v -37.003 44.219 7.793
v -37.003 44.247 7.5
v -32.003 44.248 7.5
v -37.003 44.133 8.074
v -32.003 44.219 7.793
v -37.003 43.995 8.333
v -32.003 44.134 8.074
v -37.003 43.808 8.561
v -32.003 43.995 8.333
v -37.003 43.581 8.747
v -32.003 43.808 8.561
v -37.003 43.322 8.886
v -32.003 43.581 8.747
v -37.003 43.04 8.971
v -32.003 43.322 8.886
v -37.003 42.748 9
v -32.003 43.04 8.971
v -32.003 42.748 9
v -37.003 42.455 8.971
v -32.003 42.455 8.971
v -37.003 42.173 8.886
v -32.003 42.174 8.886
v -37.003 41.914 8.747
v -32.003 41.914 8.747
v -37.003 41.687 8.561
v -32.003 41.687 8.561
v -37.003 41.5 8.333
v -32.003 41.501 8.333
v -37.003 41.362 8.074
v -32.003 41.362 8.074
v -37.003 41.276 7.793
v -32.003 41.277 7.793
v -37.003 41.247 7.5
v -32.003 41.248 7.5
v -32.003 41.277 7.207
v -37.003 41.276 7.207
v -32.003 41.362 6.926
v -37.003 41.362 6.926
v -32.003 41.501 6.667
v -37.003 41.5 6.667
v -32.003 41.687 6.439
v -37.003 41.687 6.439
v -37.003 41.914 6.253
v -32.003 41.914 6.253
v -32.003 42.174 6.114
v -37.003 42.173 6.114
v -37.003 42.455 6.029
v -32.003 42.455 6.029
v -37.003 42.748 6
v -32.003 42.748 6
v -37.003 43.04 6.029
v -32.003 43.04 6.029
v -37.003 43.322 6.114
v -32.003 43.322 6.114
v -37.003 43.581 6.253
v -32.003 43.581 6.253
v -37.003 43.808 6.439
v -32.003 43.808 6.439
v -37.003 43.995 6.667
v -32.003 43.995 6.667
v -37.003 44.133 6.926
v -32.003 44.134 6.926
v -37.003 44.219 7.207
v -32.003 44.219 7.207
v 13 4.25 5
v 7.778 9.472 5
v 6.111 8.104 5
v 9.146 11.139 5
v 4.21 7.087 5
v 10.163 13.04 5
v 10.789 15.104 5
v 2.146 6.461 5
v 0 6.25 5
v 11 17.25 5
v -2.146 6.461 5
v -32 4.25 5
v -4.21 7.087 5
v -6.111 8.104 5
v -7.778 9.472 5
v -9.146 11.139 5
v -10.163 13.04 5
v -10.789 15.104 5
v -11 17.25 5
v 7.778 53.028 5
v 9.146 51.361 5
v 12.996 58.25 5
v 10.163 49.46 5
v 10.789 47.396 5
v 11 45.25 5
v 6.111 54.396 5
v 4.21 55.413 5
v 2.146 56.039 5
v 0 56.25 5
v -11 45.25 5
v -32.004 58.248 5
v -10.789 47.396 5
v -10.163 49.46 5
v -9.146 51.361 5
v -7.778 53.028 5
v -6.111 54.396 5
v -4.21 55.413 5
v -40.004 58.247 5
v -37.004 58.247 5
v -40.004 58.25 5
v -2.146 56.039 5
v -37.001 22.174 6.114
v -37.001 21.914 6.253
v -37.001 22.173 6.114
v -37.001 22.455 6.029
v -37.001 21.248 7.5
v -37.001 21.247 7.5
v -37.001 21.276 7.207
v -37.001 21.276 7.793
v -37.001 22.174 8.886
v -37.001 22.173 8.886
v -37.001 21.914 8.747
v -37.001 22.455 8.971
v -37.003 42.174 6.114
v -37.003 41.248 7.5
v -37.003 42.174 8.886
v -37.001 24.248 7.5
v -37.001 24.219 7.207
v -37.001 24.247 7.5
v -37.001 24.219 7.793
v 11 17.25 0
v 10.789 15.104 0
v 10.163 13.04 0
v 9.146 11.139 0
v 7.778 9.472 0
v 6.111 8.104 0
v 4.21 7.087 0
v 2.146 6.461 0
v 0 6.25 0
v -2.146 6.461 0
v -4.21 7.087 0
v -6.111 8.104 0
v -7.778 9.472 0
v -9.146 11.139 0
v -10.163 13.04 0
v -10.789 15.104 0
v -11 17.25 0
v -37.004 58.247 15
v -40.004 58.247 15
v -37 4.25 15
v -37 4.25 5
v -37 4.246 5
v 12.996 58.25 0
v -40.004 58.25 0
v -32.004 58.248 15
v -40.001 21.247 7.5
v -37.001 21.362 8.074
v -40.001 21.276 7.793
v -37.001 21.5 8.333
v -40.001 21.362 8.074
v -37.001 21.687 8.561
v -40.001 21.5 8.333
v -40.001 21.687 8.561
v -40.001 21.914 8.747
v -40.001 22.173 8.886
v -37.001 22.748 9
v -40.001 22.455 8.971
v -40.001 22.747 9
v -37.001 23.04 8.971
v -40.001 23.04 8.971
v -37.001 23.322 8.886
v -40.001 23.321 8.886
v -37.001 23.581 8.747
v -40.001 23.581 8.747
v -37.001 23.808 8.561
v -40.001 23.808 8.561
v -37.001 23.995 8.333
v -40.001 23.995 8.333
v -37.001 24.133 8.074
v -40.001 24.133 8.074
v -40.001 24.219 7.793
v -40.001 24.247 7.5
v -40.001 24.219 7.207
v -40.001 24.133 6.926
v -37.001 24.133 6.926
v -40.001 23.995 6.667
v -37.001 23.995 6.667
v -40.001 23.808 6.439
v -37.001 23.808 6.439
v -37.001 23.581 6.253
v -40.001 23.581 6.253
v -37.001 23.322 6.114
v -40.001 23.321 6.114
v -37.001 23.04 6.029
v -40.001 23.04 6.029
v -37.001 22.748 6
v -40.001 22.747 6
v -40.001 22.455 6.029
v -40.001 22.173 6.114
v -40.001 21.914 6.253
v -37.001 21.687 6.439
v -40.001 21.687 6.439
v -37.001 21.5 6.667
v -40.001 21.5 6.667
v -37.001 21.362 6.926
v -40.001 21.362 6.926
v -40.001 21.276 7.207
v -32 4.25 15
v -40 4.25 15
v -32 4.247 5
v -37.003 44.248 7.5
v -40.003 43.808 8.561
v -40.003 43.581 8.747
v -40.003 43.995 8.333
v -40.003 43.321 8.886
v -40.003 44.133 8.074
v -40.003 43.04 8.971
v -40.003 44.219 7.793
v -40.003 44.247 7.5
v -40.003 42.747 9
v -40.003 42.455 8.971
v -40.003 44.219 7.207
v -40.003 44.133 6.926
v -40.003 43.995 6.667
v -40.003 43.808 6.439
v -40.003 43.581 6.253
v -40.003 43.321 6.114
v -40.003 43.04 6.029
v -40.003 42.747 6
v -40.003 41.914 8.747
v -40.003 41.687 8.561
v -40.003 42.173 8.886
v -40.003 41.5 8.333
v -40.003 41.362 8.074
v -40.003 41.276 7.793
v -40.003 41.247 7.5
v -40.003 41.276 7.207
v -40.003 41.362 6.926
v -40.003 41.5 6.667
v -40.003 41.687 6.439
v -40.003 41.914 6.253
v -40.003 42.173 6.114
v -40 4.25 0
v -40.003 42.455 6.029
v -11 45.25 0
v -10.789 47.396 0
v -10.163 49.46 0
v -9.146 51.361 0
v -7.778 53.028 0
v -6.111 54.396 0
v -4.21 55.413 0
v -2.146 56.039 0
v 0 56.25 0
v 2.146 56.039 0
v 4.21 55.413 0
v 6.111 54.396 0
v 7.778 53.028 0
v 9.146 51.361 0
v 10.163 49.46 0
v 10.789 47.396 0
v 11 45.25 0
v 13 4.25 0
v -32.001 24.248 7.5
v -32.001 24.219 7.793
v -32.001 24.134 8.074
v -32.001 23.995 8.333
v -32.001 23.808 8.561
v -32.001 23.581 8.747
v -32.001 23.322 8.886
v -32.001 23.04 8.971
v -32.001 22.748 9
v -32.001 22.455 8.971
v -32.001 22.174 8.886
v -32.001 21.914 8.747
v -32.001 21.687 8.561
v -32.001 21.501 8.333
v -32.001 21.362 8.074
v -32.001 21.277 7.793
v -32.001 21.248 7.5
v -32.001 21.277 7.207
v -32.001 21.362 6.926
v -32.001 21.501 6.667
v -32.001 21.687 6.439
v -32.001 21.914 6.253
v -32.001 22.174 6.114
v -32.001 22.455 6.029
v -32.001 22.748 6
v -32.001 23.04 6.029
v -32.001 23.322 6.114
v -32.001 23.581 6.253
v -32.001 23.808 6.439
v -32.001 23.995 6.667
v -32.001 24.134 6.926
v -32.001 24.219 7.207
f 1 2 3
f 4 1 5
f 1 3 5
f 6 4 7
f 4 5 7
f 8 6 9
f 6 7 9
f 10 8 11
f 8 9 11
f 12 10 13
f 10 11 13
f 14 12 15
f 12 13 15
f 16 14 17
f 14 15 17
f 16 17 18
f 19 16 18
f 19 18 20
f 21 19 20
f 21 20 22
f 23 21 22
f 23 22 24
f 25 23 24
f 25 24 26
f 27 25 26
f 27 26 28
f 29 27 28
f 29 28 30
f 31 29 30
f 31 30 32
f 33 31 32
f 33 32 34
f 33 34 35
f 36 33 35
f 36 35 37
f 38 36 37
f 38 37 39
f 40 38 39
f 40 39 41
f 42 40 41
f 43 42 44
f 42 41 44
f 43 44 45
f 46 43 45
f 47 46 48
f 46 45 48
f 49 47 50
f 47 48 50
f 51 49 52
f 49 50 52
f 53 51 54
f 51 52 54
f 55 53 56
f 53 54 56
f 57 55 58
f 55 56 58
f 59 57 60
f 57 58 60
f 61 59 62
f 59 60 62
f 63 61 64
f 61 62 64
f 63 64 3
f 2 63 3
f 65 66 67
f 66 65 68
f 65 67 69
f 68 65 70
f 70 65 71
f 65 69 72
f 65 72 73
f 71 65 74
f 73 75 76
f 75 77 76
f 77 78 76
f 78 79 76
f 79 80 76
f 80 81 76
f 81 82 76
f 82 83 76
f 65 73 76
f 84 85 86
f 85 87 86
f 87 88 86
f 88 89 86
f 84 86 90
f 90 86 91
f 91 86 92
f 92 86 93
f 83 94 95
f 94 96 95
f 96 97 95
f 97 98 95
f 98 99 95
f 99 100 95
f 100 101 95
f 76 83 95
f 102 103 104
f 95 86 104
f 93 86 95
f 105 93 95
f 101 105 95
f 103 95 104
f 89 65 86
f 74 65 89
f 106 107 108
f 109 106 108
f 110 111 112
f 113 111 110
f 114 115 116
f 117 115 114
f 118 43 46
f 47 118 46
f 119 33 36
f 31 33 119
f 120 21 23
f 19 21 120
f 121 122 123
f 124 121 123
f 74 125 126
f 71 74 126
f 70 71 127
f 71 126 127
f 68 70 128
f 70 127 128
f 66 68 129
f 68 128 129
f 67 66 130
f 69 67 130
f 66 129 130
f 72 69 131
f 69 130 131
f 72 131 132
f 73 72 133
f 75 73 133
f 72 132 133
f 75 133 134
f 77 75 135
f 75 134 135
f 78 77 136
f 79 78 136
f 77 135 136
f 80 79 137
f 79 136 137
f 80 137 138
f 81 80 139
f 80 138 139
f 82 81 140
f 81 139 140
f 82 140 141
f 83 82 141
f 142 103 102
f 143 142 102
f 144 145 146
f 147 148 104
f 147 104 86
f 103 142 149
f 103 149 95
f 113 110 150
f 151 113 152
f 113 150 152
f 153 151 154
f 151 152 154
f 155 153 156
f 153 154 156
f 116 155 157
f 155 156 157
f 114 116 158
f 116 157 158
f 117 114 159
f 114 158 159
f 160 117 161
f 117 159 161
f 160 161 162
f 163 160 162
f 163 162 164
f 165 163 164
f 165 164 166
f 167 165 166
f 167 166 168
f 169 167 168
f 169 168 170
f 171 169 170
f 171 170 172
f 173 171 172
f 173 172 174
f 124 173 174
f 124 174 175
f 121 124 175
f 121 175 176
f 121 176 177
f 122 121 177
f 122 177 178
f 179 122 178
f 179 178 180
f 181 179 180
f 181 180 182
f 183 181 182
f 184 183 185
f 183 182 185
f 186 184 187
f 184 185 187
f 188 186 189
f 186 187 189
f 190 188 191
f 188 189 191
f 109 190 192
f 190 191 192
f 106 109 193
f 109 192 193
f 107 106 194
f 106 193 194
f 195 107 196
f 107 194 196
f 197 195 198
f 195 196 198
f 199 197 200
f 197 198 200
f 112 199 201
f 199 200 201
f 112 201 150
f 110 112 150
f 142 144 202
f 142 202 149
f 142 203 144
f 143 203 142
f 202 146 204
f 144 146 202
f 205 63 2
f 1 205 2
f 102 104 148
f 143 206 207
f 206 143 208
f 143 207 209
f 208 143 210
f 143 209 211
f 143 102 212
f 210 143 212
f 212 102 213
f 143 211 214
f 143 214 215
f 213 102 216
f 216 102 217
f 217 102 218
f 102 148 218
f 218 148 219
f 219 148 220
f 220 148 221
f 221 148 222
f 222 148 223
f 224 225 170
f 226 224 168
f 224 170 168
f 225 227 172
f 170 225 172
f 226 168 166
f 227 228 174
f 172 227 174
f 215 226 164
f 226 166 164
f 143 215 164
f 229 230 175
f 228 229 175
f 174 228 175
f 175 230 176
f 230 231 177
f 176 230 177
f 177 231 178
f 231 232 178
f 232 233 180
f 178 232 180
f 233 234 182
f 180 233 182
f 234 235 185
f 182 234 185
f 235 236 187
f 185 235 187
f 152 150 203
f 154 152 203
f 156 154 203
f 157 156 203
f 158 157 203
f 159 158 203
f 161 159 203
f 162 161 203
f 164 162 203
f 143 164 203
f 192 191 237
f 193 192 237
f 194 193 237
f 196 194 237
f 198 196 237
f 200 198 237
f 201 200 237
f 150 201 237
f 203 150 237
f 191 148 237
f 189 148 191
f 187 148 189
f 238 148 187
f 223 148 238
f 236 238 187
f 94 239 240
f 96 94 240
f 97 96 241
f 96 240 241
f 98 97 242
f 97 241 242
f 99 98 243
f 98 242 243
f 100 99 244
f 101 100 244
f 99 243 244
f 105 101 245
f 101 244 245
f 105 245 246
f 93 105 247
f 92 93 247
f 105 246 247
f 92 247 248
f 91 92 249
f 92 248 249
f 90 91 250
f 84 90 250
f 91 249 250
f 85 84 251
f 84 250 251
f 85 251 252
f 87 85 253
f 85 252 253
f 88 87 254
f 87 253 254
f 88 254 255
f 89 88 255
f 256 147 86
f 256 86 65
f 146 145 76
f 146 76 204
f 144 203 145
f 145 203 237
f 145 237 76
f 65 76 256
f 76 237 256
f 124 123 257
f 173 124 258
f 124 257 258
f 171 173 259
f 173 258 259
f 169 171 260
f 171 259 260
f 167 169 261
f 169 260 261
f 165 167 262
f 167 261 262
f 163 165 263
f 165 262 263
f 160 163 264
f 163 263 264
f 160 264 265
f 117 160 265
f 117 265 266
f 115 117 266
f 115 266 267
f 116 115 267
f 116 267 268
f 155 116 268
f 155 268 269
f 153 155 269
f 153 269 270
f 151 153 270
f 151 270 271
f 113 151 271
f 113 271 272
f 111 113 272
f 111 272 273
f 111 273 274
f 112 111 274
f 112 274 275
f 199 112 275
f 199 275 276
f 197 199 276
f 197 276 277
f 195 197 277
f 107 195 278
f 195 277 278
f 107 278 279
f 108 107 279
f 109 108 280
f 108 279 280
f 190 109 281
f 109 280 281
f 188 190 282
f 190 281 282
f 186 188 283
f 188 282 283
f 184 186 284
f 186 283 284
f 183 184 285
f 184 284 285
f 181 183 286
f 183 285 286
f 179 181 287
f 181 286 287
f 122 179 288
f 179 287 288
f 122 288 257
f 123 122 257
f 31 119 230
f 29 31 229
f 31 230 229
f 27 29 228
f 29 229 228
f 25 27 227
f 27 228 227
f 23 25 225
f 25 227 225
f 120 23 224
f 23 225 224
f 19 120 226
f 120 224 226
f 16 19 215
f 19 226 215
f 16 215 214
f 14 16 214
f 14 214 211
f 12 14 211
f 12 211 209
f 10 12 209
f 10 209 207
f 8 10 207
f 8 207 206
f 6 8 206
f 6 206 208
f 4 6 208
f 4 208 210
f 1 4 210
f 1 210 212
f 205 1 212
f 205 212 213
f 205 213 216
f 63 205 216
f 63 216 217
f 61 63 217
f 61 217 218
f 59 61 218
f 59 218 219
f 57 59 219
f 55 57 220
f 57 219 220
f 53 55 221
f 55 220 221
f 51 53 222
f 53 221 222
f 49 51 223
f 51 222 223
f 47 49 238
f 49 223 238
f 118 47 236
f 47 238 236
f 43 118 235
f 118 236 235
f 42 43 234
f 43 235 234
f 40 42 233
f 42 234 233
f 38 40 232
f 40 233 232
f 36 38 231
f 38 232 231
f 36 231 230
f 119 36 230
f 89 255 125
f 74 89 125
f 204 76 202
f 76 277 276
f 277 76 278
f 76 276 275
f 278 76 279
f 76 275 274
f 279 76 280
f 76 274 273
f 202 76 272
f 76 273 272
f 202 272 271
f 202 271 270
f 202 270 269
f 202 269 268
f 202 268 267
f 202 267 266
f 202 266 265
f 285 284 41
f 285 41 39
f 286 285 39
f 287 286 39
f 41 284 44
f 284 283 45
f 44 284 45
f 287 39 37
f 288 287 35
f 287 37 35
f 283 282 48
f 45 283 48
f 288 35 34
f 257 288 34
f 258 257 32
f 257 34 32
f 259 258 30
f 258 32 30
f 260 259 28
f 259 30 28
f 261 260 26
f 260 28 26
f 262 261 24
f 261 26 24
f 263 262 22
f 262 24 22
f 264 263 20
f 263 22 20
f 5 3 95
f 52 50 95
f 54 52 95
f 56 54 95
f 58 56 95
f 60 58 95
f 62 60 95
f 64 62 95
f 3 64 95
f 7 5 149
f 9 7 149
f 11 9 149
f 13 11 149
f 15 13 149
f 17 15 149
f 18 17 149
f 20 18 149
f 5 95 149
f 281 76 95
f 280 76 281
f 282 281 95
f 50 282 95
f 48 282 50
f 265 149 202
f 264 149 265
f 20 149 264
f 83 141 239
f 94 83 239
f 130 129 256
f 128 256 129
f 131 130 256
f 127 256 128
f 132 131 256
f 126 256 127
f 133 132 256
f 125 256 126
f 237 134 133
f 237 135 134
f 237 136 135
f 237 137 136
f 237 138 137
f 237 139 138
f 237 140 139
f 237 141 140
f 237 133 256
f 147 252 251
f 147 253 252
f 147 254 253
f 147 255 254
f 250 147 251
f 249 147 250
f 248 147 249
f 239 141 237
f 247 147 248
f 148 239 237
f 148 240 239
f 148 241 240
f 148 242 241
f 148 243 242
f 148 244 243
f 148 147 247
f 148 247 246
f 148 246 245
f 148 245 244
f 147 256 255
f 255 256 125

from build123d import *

# Parameters (mm, degrees)
EXTRUDE_1_DEPTH      = 5
CUT_EXTRUDE_11_DEPTH = 5
EXTRUDE_2_DEPTH      = 10
CUT_EXTRUDE_12_REACH = 82.171
SKETCH_5_R           = 1.5
EXTRUDE_3_DEPTH      = 5
SKETCH_7_R           = 1.5
CUT_EXTRUDE_13_DEPTH = 5


with BuildPart() as part:
    # 草图2 → 凸台-拉伸1 (new body)
    with BuildSketch(Plane.XY):
        Polygon((12.999999835, 4.25), (-40.000000165, 4.25), (-40.003932239, 58.249999857), (12.996067761, 58.249999857), align=None)
    extrude(amount=EXTRUDE_1_DEPTH)

    # 草图3 → 切除-拉伸11 (cut)
    with BuildSketch(Plane.XY):
        with BuildLine():
            Line((-11, 17.25), (-11, 45.25))
            ThreePointArc((-11, 45.25), (0, 56.25), (11, 45.25))
            Line((11, 45.25), (11, 17.25))
            ThreePointArc((11, 17.25), (0, 6.25), (-11, 17.25))
        make_face()
    extrude(amount=CUT_EXTRUDE_11_DEPTH, mode=Mode.SUBTRACT)

    # 草图4 → 凸台-拉伸2 (add)
    with BuildSketch(Plane.XY.offset(5)):
        Polygon((-40.000000165, 4.25), (-37.000000165, 4.25), (-37.003932052, 58.247432028), (-40.003932052, 58.247432028), align=None)
    extrude(amount=EXTRUDE_2_DEPTH)

    # 草图5 → 切除-拉伸12 (cut, up to next)
    with BuildSketch(Plane(origin=(-39.999690484, -0.002912625, 0), x_dir=(0, 0, 1), z_dir=(-0.9999999973489005, -7.281619930679468e-05, 0)), mode=Mode.PRIVATE) as cut_extrude_12_sk1:
        with Locations(Location((7.5, 42.750344808, 0), (0, 0, 270))):
            Circle(SKETCH_5_R)
    cut_extrude_12_tool1 = extrude(cut_extrude_12_sk1.sketch, amount=-CUT_EXTRUDE_12_REACH, mode=Mode.PRIVATE) & part.part
    # 草图5 → 切除-拉伸12 (cut, up to next)
    with BuildSketch(Plane(origin=(-39.999690484, -0.002912625, 0), x_dir=(0, 0, 1), z_dir=(-0.9999999973489005, -7.281619930679468e-05, 0)), mode=Mode.PRIVATE) as cut_extrude_12_sk2:
        with Locations(Location((7.5, 22.750344808, 0), (0, 0, 270))):
            Circle(SKETCH_5_R)
    cut_extrude_12_tool2 = extrude(cut_extrude_12_sk2.sketch, amount=-CUT_EXTRUDE_12_REACH, mode=Mode.PRIVATE) & part.part
    add(cut_extrude_12_tool1.solids().sort_by_distance((-40.002803, 42.747432, 7.5))[0], mode=Mode.SUBTRACT)
    add(cut_extrude_12_tool2.solids().sort_by_distance((-40.001347, 22.747432, 7.5))[0], mode=Mode.SUBTRACT)

    # 草图6 → 凸台-拉伸3 (add)
    with BuildSketch(Plane(origin=(-36.9996905, -0.002694177, 0), x_dir=(0, 0, -1), z_dir=(0.9999999973489007, 7.281619931373636e-05, 0))):
        Polygon((-15, 58.25012636), (-5, 58.25012636), (-5, 4.249053378), (-15, 4.252694188), align=None)
    extrude(amount=EXTRUDE_3_DEPTH)

    # 草图7 → 切除-拉伸13 (cut)
    with BuildSketch(Plane(origin=(-31.999690513, -0.002330096, 0), x_dir=(0, 0, -1), z_dir=(0.9999999973489007, 7.281619931373636e-05, 0))):
        with Locations(Location((-7.5, 42.75012636, 0), (0, 0, 90))):
            Circle(SKETCH_7_R)
        with Locations(Location((-7.5, 22.75012636, 0), (0, 0, 90))):
            Circle(SKETCH_7_R)
    extrude(amount=-CUT_EXTRUDE_13_DEPTH, mode=Mode.SUBTRACT)


solid = part.part
